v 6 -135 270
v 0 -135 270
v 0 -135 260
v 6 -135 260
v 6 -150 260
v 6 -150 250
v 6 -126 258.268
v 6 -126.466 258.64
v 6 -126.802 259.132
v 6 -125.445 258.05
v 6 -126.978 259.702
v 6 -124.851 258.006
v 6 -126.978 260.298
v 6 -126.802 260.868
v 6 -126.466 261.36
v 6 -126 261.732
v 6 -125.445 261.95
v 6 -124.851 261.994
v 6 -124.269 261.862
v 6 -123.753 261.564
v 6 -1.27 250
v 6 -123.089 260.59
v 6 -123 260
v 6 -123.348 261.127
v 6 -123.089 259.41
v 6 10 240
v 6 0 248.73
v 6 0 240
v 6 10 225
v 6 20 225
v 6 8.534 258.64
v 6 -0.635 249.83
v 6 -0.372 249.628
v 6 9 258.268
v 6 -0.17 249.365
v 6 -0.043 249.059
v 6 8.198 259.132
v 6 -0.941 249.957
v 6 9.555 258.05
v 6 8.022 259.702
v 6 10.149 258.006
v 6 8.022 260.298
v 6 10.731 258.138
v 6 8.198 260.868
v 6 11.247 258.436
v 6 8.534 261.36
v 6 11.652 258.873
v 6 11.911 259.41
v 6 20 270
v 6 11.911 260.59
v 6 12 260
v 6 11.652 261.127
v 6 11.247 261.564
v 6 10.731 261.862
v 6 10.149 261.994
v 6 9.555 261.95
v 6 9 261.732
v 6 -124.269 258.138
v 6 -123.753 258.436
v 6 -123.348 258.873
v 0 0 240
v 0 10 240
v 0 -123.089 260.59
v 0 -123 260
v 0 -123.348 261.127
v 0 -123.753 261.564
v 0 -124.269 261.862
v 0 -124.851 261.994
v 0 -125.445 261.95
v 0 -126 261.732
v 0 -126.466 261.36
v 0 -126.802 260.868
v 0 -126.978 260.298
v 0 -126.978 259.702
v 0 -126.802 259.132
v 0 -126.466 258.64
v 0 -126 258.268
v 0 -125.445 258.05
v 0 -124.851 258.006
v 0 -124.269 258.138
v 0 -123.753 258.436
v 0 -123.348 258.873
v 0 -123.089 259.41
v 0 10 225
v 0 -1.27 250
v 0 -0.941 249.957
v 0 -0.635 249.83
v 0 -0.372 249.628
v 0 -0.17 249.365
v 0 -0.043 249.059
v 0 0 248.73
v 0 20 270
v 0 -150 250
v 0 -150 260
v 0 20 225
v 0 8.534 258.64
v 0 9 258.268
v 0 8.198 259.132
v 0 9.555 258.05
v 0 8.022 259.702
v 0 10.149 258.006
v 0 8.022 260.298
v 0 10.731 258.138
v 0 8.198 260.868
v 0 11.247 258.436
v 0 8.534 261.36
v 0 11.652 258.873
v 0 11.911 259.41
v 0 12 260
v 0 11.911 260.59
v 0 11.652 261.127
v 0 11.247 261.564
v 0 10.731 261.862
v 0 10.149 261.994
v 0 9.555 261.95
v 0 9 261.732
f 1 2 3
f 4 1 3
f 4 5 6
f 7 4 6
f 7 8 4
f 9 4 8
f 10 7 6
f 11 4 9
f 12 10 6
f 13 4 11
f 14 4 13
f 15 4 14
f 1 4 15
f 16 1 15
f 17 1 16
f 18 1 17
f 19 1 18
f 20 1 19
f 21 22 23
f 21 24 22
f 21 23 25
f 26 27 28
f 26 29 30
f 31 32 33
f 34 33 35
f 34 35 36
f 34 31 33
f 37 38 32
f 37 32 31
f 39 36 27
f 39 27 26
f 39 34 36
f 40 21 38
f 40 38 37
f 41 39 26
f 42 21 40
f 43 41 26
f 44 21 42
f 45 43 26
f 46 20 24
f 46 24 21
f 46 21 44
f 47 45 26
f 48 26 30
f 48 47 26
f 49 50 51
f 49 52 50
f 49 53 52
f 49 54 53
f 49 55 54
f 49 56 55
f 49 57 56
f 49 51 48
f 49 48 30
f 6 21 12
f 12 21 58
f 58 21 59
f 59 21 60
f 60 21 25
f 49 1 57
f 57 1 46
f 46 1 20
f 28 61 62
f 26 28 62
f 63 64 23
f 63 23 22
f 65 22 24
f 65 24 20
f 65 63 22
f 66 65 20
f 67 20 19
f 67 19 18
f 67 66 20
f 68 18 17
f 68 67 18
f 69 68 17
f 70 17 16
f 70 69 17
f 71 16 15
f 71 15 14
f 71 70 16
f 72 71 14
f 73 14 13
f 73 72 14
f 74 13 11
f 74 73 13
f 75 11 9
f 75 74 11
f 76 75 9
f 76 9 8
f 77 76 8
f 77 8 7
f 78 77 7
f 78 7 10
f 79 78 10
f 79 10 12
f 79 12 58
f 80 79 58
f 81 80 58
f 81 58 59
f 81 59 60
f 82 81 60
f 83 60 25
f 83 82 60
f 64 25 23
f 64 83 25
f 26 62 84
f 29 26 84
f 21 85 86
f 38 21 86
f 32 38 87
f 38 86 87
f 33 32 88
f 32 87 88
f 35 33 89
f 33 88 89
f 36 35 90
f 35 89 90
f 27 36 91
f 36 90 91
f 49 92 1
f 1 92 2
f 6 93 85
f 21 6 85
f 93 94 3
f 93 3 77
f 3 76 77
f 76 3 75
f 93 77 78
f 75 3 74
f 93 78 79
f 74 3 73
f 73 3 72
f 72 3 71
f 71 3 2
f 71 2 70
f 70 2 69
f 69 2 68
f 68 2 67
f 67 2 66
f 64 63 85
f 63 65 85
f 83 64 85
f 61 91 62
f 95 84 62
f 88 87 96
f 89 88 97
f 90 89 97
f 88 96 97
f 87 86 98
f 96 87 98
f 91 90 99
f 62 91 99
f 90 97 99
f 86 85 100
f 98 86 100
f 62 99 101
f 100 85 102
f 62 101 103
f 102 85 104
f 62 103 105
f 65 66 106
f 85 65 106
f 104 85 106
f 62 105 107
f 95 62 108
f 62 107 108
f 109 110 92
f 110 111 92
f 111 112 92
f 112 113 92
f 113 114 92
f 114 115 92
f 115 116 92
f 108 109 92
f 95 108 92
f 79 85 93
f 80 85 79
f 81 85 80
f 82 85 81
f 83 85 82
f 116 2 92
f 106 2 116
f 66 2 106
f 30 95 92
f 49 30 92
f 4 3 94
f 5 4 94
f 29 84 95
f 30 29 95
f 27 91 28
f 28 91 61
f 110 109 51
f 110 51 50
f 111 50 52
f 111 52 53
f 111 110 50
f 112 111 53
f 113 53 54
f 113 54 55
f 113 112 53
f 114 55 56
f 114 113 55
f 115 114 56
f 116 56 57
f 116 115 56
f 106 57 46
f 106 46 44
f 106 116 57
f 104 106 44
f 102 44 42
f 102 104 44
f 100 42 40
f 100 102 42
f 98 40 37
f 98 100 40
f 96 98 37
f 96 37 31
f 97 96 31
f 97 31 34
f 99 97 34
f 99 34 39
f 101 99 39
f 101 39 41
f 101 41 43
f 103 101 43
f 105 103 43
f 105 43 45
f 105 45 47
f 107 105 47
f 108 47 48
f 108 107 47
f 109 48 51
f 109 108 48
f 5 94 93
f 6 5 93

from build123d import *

# Parameters (mm, degrees)
F0_R     = 2
F1_DEPTH = 6


with BuildPart() as f1:
    # F0 (on Right) → F1 (new body)
    with BuildSketch(Plane.YZ):
        with BuildLine():
            Line((-150, 250), (-1.27, 250))
            ThreePointArc((-1.27, 250), (-0.371974, 249.628026), (0, 248.73))
            Line((0, 248.73), (0, 240))
            Line((0, 240), (10, 240))
            Line((10, 240), (10, 225))
            Line((10, 225), (20, 225))
            Line((20, 225), (20, 270))
            Line((20, 270), (-135, 270))
            Line((-135, 270), (-135, 260))
            Line((-135, 260), (-150, 260))
            Line((-150, 260), (-150, 250))
        make_face()
        with Locations((-125, 260)):
            Circle(F0_R, mode=Mode.SUBTRACT)
        with Locations((10, 260)):
            Circle(F0_R, mode=Mode.SUBTRACT)
    extrude(amount=F1_DEPTH)


solid = f1.part
